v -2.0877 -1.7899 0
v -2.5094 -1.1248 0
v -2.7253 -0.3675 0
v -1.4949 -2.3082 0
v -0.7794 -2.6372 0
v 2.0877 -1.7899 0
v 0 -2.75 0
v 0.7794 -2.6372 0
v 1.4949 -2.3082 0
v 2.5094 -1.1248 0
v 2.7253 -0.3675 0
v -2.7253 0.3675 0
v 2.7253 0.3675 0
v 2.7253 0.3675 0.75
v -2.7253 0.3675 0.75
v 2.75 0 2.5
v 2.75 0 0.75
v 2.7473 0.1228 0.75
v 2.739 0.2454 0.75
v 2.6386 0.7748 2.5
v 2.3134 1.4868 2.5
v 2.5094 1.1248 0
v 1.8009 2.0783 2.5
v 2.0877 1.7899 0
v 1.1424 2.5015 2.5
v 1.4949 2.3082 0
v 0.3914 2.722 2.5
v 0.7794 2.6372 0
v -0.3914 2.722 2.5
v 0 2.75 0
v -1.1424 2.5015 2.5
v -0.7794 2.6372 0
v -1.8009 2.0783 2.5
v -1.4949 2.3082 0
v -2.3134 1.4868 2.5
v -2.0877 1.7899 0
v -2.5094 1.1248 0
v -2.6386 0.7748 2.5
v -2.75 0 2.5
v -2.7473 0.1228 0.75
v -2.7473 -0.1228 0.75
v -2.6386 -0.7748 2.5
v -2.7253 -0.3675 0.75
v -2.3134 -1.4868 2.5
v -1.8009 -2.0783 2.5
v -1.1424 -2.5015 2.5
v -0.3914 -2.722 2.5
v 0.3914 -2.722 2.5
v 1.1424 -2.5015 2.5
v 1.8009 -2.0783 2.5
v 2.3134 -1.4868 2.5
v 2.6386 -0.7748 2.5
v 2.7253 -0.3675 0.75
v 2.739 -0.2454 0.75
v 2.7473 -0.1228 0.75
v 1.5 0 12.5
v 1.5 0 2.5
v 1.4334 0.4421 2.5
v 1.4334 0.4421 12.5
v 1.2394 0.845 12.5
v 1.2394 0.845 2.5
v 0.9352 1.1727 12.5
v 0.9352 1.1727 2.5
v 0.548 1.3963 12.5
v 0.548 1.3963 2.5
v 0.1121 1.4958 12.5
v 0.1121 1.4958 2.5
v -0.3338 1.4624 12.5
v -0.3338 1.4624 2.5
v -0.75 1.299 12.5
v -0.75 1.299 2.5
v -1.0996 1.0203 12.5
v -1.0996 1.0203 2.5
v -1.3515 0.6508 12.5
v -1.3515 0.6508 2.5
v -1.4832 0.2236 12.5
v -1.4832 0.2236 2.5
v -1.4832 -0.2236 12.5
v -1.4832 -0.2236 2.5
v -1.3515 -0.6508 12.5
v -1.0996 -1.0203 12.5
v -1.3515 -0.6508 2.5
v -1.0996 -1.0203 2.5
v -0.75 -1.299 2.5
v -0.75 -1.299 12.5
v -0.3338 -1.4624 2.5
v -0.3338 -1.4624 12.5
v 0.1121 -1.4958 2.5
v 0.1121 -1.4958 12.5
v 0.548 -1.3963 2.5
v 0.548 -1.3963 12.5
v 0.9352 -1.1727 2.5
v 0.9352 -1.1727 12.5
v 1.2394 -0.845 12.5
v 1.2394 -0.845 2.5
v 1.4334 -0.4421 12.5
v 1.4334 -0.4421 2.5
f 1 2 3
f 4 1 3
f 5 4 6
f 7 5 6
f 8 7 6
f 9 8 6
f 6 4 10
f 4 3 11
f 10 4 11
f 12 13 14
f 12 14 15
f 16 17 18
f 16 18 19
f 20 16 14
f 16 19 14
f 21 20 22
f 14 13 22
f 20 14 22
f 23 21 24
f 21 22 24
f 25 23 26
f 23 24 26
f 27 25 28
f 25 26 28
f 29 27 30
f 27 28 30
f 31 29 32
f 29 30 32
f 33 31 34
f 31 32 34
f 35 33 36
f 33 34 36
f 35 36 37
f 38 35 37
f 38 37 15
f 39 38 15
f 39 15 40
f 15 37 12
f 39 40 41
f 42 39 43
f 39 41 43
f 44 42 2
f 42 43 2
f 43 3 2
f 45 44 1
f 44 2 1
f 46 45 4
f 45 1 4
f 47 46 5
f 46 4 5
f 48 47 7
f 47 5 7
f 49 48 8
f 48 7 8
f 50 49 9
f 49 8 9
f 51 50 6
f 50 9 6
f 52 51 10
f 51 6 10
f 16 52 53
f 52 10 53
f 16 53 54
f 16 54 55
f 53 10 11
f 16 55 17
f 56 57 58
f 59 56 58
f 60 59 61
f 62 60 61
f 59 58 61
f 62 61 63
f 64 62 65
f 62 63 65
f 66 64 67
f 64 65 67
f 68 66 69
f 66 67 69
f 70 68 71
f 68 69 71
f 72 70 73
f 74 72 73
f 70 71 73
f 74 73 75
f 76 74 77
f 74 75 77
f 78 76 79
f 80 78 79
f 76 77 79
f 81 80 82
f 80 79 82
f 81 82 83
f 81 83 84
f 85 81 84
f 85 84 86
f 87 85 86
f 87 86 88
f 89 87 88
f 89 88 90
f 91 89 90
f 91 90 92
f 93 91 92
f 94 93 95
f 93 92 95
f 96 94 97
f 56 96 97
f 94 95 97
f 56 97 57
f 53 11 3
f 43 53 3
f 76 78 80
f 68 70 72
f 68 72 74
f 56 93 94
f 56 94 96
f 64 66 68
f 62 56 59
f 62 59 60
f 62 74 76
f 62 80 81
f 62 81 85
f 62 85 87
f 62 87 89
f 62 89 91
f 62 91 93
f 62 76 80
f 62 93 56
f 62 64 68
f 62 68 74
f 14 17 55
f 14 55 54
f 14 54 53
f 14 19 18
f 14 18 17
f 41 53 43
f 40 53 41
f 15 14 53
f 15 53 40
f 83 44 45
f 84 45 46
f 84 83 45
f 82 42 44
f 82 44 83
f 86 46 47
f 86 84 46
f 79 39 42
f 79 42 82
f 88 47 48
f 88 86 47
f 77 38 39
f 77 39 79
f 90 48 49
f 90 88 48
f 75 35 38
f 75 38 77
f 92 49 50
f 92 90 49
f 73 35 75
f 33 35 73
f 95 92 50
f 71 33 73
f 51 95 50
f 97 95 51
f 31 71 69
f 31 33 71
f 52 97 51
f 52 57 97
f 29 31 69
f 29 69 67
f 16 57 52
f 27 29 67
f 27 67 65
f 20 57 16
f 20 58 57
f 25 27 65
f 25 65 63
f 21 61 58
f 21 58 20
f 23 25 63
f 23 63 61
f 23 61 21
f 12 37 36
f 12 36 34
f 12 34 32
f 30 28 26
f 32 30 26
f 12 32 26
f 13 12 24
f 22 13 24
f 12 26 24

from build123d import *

# Parameters (mm, degrees)
ESQUISSE1_R             = 2.75
BOSS_EXTRU_1_DEPTH      = 2.5
ESQUISSE2_R             = 1.5
BOSS_EXTRU_2_DEPTH      = 10
ESQUISSE3_W             = 7.386684128
ESQUISSE3_H             = 0.735038592
ENL_V_MAT_EXTRU_1_DEPTH = 0.75


with BuildPart() as part:
    # Esquisse1 → Boss.-Extru.1 (new body)
    with BuildSketch(Plane.XY):
        Circle(ESQUISSE1_R)
    extrude(amount=BOSS_EXTRU_1_DEPTH)

    # Esquisse2 → Boss.-Extru.2 (add)
    with BuildSketch(Plane.XY.offset(2.5)):
        Circle(ESQUISSE2_R)
    extrude(amount=BOSS_EXTRU_2_DEPTH)

    # Esquisse3 → Enlèv. mat.-Extru.1 (cut)
    with BuildSketch(Plane(origin=(0, 0, 0), x_dir=(-1, 0, 0), z_dir=(0, 0, -1))):
        Rectangle(ESQUISSE3_W, ESQUISSE3_H)
    extrude(amount=-ENL_V_MAT_EXTRU_1_DEPTH, mode=Mode.SUBTRACT)


solid = part.part
